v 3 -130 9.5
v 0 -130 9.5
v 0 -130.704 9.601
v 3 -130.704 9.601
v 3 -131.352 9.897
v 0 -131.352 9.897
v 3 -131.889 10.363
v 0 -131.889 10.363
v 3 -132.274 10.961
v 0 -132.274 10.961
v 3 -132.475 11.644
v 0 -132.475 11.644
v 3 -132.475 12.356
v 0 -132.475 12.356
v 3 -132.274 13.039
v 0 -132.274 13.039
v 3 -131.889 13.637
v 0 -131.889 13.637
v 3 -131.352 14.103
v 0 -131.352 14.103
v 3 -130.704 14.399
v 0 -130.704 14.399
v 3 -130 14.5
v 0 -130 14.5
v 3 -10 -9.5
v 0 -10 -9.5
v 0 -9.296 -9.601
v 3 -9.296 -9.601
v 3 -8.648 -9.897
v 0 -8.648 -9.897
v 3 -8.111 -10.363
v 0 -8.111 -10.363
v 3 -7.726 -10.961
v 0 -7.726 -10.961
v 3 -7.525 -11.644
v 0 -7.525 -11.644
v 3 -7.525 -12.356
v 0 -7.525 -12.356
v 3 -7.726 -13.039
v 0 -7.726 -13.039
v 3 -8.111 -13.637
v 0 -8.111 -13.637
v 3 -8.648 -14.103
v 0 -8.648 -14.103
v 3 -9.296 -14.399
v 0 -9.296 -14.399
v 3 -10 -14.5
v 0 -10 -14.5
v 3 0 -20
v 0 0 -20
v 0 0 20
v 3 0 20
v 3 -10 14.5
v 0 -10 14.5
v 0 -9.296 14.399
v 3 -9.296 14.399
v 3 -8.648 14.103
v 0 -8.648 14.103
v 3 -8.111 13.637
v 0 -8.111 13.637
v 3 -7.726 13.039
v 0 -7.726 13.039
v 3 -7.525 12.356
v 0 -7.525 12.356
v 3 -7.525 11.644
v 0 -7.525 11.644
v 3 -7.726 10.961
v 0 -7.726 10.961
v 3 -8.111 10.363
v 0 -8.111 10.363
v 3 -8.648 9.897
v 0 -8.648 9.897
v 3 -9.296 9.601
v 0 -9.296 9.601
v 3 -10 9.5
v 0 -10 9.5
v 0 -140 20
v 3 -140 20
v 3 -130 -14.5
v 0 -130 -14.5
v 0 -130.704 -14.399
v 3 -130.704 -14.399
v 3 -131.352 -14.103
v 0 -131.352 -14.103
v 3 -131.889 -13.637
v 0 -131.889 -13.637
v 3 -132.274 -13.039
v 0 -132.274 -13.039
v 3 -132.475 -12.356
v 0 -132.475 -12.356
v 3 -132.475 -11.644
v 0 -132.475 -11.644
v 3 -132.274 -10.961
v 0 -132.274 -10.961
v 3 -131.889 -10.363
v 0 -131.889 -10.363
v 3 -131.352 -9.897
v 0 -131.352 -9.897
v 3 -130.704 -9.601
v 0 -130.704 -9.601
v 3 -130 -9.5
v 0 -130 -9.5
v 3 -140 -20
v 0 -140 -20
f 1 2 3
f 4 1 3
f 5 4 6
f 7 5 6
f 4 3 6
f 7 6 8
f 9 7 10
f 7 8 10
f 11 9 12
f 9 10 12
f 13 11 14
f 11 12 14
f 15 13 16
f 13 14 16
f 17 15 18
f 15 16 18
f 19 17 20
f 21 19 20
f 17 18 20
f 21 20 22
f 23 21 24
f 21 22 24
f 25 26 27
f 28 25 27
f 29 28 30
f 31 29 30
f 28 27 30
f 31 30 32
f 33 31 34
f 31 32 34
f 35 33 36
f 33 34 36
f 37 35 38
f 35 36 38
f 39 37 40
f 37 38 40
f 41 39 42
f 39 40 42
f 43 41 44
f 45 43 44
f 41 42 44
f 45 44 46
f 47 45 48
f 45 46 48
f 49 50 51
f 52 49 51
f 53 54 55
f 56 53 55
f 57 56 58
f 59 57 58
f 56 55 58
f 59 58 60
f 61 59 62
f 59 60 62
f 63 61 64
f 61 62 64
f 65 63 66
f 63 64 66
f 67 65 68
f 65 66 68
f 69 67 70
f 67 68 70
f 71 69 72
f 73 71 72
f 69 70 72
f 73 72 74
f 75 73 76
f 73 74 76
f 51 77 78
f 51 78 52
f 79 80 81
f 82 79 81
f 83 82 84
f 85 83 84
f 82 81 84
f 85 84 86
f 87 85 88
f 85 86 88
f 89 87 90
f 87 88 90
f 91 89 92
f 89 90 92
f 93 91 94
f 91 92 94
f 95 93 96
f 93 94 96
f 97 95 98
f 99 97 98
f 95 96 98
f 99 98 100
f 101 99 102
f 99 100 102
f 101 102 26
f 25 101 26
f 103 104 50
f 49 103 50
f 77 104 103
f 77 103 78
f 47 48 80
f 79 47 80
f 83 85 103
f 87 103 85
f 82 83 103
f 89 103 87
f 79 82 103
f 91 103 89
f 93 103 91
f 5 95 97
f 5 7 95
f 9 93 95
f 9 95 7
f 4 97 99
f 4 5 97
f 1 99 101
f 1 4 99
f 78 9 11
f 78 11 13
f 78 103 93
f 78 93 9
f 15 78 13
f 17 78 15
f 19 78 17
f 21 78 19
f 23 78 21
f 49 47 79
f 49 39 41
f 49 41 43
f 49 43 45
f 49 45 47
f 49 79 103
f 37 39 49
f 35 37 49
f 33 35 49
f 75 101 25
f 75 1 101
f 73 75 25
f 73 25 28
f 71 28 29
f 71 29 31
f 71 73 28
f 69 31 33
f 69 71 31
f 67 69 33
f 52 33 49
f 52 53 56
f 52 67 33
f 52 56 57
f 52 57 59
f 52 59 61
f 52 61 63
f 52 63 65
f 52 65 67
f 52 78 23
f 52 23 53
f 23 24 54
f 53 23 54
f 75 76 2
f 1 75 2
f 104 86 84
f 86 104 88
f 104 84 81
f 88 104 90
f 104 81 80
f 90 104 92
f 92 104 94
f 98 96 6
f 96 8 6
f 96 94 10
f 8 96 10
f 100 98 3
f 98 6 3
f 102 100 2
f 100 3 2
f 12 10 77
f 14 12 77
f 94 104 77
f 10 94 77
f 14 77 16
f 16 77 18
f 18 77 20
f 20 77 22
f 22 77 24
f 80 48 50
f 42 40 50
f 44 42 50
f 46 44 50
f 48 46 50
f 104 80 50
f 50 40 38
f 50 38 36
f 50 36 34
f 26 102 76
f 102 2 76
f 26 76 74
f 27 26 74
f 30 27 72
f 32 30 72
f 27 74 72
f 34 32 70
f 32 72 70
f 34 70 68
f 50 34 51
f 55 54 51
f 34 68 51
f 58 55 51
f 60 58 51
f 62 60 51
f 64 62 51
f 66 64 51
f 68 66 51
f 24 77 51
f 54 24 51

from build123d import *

# Parameters (mm, degrees)
F0_W     = 140
F0_H     = 40
F1_DEPTH = 3


with BuildPart() as f1:
    # F0 (on Right) → F1 (new body)
    with BuildSketch(Plane.YZ):
        with Locations((-70, 0)):
            Rectangle(F0_W, F0_H)
        with BuildLine():
            ThreePointArc((-130, -14.5), (-132.5, -12), (-130, -9.5))
            Line((-130, -9.5), (-10, -9.5))
            ThreePointArc((-10, -9.5), (-7.5, -12), (-10, -14.5))
            Line((-10, -14.5), (-130, -14.5))
        make_face(mode=Mode.SUBTRACT)
        with BuildLine():
            ThreePointArc((-130, 9.5), (-132.5, 12), (-130, 14.5))
            Line((-130, 14.5), (-10, 14.5))
            ThreePointArc((-10, 14.5), (-7.5, 12), (-10, 9.5))
            Line((-10, 9.5), (-130, 9.5))
        make_face(mode=Mode.SUBTRACT)
    extrude(amount=F1_DEPTH)


solid = f1.part
